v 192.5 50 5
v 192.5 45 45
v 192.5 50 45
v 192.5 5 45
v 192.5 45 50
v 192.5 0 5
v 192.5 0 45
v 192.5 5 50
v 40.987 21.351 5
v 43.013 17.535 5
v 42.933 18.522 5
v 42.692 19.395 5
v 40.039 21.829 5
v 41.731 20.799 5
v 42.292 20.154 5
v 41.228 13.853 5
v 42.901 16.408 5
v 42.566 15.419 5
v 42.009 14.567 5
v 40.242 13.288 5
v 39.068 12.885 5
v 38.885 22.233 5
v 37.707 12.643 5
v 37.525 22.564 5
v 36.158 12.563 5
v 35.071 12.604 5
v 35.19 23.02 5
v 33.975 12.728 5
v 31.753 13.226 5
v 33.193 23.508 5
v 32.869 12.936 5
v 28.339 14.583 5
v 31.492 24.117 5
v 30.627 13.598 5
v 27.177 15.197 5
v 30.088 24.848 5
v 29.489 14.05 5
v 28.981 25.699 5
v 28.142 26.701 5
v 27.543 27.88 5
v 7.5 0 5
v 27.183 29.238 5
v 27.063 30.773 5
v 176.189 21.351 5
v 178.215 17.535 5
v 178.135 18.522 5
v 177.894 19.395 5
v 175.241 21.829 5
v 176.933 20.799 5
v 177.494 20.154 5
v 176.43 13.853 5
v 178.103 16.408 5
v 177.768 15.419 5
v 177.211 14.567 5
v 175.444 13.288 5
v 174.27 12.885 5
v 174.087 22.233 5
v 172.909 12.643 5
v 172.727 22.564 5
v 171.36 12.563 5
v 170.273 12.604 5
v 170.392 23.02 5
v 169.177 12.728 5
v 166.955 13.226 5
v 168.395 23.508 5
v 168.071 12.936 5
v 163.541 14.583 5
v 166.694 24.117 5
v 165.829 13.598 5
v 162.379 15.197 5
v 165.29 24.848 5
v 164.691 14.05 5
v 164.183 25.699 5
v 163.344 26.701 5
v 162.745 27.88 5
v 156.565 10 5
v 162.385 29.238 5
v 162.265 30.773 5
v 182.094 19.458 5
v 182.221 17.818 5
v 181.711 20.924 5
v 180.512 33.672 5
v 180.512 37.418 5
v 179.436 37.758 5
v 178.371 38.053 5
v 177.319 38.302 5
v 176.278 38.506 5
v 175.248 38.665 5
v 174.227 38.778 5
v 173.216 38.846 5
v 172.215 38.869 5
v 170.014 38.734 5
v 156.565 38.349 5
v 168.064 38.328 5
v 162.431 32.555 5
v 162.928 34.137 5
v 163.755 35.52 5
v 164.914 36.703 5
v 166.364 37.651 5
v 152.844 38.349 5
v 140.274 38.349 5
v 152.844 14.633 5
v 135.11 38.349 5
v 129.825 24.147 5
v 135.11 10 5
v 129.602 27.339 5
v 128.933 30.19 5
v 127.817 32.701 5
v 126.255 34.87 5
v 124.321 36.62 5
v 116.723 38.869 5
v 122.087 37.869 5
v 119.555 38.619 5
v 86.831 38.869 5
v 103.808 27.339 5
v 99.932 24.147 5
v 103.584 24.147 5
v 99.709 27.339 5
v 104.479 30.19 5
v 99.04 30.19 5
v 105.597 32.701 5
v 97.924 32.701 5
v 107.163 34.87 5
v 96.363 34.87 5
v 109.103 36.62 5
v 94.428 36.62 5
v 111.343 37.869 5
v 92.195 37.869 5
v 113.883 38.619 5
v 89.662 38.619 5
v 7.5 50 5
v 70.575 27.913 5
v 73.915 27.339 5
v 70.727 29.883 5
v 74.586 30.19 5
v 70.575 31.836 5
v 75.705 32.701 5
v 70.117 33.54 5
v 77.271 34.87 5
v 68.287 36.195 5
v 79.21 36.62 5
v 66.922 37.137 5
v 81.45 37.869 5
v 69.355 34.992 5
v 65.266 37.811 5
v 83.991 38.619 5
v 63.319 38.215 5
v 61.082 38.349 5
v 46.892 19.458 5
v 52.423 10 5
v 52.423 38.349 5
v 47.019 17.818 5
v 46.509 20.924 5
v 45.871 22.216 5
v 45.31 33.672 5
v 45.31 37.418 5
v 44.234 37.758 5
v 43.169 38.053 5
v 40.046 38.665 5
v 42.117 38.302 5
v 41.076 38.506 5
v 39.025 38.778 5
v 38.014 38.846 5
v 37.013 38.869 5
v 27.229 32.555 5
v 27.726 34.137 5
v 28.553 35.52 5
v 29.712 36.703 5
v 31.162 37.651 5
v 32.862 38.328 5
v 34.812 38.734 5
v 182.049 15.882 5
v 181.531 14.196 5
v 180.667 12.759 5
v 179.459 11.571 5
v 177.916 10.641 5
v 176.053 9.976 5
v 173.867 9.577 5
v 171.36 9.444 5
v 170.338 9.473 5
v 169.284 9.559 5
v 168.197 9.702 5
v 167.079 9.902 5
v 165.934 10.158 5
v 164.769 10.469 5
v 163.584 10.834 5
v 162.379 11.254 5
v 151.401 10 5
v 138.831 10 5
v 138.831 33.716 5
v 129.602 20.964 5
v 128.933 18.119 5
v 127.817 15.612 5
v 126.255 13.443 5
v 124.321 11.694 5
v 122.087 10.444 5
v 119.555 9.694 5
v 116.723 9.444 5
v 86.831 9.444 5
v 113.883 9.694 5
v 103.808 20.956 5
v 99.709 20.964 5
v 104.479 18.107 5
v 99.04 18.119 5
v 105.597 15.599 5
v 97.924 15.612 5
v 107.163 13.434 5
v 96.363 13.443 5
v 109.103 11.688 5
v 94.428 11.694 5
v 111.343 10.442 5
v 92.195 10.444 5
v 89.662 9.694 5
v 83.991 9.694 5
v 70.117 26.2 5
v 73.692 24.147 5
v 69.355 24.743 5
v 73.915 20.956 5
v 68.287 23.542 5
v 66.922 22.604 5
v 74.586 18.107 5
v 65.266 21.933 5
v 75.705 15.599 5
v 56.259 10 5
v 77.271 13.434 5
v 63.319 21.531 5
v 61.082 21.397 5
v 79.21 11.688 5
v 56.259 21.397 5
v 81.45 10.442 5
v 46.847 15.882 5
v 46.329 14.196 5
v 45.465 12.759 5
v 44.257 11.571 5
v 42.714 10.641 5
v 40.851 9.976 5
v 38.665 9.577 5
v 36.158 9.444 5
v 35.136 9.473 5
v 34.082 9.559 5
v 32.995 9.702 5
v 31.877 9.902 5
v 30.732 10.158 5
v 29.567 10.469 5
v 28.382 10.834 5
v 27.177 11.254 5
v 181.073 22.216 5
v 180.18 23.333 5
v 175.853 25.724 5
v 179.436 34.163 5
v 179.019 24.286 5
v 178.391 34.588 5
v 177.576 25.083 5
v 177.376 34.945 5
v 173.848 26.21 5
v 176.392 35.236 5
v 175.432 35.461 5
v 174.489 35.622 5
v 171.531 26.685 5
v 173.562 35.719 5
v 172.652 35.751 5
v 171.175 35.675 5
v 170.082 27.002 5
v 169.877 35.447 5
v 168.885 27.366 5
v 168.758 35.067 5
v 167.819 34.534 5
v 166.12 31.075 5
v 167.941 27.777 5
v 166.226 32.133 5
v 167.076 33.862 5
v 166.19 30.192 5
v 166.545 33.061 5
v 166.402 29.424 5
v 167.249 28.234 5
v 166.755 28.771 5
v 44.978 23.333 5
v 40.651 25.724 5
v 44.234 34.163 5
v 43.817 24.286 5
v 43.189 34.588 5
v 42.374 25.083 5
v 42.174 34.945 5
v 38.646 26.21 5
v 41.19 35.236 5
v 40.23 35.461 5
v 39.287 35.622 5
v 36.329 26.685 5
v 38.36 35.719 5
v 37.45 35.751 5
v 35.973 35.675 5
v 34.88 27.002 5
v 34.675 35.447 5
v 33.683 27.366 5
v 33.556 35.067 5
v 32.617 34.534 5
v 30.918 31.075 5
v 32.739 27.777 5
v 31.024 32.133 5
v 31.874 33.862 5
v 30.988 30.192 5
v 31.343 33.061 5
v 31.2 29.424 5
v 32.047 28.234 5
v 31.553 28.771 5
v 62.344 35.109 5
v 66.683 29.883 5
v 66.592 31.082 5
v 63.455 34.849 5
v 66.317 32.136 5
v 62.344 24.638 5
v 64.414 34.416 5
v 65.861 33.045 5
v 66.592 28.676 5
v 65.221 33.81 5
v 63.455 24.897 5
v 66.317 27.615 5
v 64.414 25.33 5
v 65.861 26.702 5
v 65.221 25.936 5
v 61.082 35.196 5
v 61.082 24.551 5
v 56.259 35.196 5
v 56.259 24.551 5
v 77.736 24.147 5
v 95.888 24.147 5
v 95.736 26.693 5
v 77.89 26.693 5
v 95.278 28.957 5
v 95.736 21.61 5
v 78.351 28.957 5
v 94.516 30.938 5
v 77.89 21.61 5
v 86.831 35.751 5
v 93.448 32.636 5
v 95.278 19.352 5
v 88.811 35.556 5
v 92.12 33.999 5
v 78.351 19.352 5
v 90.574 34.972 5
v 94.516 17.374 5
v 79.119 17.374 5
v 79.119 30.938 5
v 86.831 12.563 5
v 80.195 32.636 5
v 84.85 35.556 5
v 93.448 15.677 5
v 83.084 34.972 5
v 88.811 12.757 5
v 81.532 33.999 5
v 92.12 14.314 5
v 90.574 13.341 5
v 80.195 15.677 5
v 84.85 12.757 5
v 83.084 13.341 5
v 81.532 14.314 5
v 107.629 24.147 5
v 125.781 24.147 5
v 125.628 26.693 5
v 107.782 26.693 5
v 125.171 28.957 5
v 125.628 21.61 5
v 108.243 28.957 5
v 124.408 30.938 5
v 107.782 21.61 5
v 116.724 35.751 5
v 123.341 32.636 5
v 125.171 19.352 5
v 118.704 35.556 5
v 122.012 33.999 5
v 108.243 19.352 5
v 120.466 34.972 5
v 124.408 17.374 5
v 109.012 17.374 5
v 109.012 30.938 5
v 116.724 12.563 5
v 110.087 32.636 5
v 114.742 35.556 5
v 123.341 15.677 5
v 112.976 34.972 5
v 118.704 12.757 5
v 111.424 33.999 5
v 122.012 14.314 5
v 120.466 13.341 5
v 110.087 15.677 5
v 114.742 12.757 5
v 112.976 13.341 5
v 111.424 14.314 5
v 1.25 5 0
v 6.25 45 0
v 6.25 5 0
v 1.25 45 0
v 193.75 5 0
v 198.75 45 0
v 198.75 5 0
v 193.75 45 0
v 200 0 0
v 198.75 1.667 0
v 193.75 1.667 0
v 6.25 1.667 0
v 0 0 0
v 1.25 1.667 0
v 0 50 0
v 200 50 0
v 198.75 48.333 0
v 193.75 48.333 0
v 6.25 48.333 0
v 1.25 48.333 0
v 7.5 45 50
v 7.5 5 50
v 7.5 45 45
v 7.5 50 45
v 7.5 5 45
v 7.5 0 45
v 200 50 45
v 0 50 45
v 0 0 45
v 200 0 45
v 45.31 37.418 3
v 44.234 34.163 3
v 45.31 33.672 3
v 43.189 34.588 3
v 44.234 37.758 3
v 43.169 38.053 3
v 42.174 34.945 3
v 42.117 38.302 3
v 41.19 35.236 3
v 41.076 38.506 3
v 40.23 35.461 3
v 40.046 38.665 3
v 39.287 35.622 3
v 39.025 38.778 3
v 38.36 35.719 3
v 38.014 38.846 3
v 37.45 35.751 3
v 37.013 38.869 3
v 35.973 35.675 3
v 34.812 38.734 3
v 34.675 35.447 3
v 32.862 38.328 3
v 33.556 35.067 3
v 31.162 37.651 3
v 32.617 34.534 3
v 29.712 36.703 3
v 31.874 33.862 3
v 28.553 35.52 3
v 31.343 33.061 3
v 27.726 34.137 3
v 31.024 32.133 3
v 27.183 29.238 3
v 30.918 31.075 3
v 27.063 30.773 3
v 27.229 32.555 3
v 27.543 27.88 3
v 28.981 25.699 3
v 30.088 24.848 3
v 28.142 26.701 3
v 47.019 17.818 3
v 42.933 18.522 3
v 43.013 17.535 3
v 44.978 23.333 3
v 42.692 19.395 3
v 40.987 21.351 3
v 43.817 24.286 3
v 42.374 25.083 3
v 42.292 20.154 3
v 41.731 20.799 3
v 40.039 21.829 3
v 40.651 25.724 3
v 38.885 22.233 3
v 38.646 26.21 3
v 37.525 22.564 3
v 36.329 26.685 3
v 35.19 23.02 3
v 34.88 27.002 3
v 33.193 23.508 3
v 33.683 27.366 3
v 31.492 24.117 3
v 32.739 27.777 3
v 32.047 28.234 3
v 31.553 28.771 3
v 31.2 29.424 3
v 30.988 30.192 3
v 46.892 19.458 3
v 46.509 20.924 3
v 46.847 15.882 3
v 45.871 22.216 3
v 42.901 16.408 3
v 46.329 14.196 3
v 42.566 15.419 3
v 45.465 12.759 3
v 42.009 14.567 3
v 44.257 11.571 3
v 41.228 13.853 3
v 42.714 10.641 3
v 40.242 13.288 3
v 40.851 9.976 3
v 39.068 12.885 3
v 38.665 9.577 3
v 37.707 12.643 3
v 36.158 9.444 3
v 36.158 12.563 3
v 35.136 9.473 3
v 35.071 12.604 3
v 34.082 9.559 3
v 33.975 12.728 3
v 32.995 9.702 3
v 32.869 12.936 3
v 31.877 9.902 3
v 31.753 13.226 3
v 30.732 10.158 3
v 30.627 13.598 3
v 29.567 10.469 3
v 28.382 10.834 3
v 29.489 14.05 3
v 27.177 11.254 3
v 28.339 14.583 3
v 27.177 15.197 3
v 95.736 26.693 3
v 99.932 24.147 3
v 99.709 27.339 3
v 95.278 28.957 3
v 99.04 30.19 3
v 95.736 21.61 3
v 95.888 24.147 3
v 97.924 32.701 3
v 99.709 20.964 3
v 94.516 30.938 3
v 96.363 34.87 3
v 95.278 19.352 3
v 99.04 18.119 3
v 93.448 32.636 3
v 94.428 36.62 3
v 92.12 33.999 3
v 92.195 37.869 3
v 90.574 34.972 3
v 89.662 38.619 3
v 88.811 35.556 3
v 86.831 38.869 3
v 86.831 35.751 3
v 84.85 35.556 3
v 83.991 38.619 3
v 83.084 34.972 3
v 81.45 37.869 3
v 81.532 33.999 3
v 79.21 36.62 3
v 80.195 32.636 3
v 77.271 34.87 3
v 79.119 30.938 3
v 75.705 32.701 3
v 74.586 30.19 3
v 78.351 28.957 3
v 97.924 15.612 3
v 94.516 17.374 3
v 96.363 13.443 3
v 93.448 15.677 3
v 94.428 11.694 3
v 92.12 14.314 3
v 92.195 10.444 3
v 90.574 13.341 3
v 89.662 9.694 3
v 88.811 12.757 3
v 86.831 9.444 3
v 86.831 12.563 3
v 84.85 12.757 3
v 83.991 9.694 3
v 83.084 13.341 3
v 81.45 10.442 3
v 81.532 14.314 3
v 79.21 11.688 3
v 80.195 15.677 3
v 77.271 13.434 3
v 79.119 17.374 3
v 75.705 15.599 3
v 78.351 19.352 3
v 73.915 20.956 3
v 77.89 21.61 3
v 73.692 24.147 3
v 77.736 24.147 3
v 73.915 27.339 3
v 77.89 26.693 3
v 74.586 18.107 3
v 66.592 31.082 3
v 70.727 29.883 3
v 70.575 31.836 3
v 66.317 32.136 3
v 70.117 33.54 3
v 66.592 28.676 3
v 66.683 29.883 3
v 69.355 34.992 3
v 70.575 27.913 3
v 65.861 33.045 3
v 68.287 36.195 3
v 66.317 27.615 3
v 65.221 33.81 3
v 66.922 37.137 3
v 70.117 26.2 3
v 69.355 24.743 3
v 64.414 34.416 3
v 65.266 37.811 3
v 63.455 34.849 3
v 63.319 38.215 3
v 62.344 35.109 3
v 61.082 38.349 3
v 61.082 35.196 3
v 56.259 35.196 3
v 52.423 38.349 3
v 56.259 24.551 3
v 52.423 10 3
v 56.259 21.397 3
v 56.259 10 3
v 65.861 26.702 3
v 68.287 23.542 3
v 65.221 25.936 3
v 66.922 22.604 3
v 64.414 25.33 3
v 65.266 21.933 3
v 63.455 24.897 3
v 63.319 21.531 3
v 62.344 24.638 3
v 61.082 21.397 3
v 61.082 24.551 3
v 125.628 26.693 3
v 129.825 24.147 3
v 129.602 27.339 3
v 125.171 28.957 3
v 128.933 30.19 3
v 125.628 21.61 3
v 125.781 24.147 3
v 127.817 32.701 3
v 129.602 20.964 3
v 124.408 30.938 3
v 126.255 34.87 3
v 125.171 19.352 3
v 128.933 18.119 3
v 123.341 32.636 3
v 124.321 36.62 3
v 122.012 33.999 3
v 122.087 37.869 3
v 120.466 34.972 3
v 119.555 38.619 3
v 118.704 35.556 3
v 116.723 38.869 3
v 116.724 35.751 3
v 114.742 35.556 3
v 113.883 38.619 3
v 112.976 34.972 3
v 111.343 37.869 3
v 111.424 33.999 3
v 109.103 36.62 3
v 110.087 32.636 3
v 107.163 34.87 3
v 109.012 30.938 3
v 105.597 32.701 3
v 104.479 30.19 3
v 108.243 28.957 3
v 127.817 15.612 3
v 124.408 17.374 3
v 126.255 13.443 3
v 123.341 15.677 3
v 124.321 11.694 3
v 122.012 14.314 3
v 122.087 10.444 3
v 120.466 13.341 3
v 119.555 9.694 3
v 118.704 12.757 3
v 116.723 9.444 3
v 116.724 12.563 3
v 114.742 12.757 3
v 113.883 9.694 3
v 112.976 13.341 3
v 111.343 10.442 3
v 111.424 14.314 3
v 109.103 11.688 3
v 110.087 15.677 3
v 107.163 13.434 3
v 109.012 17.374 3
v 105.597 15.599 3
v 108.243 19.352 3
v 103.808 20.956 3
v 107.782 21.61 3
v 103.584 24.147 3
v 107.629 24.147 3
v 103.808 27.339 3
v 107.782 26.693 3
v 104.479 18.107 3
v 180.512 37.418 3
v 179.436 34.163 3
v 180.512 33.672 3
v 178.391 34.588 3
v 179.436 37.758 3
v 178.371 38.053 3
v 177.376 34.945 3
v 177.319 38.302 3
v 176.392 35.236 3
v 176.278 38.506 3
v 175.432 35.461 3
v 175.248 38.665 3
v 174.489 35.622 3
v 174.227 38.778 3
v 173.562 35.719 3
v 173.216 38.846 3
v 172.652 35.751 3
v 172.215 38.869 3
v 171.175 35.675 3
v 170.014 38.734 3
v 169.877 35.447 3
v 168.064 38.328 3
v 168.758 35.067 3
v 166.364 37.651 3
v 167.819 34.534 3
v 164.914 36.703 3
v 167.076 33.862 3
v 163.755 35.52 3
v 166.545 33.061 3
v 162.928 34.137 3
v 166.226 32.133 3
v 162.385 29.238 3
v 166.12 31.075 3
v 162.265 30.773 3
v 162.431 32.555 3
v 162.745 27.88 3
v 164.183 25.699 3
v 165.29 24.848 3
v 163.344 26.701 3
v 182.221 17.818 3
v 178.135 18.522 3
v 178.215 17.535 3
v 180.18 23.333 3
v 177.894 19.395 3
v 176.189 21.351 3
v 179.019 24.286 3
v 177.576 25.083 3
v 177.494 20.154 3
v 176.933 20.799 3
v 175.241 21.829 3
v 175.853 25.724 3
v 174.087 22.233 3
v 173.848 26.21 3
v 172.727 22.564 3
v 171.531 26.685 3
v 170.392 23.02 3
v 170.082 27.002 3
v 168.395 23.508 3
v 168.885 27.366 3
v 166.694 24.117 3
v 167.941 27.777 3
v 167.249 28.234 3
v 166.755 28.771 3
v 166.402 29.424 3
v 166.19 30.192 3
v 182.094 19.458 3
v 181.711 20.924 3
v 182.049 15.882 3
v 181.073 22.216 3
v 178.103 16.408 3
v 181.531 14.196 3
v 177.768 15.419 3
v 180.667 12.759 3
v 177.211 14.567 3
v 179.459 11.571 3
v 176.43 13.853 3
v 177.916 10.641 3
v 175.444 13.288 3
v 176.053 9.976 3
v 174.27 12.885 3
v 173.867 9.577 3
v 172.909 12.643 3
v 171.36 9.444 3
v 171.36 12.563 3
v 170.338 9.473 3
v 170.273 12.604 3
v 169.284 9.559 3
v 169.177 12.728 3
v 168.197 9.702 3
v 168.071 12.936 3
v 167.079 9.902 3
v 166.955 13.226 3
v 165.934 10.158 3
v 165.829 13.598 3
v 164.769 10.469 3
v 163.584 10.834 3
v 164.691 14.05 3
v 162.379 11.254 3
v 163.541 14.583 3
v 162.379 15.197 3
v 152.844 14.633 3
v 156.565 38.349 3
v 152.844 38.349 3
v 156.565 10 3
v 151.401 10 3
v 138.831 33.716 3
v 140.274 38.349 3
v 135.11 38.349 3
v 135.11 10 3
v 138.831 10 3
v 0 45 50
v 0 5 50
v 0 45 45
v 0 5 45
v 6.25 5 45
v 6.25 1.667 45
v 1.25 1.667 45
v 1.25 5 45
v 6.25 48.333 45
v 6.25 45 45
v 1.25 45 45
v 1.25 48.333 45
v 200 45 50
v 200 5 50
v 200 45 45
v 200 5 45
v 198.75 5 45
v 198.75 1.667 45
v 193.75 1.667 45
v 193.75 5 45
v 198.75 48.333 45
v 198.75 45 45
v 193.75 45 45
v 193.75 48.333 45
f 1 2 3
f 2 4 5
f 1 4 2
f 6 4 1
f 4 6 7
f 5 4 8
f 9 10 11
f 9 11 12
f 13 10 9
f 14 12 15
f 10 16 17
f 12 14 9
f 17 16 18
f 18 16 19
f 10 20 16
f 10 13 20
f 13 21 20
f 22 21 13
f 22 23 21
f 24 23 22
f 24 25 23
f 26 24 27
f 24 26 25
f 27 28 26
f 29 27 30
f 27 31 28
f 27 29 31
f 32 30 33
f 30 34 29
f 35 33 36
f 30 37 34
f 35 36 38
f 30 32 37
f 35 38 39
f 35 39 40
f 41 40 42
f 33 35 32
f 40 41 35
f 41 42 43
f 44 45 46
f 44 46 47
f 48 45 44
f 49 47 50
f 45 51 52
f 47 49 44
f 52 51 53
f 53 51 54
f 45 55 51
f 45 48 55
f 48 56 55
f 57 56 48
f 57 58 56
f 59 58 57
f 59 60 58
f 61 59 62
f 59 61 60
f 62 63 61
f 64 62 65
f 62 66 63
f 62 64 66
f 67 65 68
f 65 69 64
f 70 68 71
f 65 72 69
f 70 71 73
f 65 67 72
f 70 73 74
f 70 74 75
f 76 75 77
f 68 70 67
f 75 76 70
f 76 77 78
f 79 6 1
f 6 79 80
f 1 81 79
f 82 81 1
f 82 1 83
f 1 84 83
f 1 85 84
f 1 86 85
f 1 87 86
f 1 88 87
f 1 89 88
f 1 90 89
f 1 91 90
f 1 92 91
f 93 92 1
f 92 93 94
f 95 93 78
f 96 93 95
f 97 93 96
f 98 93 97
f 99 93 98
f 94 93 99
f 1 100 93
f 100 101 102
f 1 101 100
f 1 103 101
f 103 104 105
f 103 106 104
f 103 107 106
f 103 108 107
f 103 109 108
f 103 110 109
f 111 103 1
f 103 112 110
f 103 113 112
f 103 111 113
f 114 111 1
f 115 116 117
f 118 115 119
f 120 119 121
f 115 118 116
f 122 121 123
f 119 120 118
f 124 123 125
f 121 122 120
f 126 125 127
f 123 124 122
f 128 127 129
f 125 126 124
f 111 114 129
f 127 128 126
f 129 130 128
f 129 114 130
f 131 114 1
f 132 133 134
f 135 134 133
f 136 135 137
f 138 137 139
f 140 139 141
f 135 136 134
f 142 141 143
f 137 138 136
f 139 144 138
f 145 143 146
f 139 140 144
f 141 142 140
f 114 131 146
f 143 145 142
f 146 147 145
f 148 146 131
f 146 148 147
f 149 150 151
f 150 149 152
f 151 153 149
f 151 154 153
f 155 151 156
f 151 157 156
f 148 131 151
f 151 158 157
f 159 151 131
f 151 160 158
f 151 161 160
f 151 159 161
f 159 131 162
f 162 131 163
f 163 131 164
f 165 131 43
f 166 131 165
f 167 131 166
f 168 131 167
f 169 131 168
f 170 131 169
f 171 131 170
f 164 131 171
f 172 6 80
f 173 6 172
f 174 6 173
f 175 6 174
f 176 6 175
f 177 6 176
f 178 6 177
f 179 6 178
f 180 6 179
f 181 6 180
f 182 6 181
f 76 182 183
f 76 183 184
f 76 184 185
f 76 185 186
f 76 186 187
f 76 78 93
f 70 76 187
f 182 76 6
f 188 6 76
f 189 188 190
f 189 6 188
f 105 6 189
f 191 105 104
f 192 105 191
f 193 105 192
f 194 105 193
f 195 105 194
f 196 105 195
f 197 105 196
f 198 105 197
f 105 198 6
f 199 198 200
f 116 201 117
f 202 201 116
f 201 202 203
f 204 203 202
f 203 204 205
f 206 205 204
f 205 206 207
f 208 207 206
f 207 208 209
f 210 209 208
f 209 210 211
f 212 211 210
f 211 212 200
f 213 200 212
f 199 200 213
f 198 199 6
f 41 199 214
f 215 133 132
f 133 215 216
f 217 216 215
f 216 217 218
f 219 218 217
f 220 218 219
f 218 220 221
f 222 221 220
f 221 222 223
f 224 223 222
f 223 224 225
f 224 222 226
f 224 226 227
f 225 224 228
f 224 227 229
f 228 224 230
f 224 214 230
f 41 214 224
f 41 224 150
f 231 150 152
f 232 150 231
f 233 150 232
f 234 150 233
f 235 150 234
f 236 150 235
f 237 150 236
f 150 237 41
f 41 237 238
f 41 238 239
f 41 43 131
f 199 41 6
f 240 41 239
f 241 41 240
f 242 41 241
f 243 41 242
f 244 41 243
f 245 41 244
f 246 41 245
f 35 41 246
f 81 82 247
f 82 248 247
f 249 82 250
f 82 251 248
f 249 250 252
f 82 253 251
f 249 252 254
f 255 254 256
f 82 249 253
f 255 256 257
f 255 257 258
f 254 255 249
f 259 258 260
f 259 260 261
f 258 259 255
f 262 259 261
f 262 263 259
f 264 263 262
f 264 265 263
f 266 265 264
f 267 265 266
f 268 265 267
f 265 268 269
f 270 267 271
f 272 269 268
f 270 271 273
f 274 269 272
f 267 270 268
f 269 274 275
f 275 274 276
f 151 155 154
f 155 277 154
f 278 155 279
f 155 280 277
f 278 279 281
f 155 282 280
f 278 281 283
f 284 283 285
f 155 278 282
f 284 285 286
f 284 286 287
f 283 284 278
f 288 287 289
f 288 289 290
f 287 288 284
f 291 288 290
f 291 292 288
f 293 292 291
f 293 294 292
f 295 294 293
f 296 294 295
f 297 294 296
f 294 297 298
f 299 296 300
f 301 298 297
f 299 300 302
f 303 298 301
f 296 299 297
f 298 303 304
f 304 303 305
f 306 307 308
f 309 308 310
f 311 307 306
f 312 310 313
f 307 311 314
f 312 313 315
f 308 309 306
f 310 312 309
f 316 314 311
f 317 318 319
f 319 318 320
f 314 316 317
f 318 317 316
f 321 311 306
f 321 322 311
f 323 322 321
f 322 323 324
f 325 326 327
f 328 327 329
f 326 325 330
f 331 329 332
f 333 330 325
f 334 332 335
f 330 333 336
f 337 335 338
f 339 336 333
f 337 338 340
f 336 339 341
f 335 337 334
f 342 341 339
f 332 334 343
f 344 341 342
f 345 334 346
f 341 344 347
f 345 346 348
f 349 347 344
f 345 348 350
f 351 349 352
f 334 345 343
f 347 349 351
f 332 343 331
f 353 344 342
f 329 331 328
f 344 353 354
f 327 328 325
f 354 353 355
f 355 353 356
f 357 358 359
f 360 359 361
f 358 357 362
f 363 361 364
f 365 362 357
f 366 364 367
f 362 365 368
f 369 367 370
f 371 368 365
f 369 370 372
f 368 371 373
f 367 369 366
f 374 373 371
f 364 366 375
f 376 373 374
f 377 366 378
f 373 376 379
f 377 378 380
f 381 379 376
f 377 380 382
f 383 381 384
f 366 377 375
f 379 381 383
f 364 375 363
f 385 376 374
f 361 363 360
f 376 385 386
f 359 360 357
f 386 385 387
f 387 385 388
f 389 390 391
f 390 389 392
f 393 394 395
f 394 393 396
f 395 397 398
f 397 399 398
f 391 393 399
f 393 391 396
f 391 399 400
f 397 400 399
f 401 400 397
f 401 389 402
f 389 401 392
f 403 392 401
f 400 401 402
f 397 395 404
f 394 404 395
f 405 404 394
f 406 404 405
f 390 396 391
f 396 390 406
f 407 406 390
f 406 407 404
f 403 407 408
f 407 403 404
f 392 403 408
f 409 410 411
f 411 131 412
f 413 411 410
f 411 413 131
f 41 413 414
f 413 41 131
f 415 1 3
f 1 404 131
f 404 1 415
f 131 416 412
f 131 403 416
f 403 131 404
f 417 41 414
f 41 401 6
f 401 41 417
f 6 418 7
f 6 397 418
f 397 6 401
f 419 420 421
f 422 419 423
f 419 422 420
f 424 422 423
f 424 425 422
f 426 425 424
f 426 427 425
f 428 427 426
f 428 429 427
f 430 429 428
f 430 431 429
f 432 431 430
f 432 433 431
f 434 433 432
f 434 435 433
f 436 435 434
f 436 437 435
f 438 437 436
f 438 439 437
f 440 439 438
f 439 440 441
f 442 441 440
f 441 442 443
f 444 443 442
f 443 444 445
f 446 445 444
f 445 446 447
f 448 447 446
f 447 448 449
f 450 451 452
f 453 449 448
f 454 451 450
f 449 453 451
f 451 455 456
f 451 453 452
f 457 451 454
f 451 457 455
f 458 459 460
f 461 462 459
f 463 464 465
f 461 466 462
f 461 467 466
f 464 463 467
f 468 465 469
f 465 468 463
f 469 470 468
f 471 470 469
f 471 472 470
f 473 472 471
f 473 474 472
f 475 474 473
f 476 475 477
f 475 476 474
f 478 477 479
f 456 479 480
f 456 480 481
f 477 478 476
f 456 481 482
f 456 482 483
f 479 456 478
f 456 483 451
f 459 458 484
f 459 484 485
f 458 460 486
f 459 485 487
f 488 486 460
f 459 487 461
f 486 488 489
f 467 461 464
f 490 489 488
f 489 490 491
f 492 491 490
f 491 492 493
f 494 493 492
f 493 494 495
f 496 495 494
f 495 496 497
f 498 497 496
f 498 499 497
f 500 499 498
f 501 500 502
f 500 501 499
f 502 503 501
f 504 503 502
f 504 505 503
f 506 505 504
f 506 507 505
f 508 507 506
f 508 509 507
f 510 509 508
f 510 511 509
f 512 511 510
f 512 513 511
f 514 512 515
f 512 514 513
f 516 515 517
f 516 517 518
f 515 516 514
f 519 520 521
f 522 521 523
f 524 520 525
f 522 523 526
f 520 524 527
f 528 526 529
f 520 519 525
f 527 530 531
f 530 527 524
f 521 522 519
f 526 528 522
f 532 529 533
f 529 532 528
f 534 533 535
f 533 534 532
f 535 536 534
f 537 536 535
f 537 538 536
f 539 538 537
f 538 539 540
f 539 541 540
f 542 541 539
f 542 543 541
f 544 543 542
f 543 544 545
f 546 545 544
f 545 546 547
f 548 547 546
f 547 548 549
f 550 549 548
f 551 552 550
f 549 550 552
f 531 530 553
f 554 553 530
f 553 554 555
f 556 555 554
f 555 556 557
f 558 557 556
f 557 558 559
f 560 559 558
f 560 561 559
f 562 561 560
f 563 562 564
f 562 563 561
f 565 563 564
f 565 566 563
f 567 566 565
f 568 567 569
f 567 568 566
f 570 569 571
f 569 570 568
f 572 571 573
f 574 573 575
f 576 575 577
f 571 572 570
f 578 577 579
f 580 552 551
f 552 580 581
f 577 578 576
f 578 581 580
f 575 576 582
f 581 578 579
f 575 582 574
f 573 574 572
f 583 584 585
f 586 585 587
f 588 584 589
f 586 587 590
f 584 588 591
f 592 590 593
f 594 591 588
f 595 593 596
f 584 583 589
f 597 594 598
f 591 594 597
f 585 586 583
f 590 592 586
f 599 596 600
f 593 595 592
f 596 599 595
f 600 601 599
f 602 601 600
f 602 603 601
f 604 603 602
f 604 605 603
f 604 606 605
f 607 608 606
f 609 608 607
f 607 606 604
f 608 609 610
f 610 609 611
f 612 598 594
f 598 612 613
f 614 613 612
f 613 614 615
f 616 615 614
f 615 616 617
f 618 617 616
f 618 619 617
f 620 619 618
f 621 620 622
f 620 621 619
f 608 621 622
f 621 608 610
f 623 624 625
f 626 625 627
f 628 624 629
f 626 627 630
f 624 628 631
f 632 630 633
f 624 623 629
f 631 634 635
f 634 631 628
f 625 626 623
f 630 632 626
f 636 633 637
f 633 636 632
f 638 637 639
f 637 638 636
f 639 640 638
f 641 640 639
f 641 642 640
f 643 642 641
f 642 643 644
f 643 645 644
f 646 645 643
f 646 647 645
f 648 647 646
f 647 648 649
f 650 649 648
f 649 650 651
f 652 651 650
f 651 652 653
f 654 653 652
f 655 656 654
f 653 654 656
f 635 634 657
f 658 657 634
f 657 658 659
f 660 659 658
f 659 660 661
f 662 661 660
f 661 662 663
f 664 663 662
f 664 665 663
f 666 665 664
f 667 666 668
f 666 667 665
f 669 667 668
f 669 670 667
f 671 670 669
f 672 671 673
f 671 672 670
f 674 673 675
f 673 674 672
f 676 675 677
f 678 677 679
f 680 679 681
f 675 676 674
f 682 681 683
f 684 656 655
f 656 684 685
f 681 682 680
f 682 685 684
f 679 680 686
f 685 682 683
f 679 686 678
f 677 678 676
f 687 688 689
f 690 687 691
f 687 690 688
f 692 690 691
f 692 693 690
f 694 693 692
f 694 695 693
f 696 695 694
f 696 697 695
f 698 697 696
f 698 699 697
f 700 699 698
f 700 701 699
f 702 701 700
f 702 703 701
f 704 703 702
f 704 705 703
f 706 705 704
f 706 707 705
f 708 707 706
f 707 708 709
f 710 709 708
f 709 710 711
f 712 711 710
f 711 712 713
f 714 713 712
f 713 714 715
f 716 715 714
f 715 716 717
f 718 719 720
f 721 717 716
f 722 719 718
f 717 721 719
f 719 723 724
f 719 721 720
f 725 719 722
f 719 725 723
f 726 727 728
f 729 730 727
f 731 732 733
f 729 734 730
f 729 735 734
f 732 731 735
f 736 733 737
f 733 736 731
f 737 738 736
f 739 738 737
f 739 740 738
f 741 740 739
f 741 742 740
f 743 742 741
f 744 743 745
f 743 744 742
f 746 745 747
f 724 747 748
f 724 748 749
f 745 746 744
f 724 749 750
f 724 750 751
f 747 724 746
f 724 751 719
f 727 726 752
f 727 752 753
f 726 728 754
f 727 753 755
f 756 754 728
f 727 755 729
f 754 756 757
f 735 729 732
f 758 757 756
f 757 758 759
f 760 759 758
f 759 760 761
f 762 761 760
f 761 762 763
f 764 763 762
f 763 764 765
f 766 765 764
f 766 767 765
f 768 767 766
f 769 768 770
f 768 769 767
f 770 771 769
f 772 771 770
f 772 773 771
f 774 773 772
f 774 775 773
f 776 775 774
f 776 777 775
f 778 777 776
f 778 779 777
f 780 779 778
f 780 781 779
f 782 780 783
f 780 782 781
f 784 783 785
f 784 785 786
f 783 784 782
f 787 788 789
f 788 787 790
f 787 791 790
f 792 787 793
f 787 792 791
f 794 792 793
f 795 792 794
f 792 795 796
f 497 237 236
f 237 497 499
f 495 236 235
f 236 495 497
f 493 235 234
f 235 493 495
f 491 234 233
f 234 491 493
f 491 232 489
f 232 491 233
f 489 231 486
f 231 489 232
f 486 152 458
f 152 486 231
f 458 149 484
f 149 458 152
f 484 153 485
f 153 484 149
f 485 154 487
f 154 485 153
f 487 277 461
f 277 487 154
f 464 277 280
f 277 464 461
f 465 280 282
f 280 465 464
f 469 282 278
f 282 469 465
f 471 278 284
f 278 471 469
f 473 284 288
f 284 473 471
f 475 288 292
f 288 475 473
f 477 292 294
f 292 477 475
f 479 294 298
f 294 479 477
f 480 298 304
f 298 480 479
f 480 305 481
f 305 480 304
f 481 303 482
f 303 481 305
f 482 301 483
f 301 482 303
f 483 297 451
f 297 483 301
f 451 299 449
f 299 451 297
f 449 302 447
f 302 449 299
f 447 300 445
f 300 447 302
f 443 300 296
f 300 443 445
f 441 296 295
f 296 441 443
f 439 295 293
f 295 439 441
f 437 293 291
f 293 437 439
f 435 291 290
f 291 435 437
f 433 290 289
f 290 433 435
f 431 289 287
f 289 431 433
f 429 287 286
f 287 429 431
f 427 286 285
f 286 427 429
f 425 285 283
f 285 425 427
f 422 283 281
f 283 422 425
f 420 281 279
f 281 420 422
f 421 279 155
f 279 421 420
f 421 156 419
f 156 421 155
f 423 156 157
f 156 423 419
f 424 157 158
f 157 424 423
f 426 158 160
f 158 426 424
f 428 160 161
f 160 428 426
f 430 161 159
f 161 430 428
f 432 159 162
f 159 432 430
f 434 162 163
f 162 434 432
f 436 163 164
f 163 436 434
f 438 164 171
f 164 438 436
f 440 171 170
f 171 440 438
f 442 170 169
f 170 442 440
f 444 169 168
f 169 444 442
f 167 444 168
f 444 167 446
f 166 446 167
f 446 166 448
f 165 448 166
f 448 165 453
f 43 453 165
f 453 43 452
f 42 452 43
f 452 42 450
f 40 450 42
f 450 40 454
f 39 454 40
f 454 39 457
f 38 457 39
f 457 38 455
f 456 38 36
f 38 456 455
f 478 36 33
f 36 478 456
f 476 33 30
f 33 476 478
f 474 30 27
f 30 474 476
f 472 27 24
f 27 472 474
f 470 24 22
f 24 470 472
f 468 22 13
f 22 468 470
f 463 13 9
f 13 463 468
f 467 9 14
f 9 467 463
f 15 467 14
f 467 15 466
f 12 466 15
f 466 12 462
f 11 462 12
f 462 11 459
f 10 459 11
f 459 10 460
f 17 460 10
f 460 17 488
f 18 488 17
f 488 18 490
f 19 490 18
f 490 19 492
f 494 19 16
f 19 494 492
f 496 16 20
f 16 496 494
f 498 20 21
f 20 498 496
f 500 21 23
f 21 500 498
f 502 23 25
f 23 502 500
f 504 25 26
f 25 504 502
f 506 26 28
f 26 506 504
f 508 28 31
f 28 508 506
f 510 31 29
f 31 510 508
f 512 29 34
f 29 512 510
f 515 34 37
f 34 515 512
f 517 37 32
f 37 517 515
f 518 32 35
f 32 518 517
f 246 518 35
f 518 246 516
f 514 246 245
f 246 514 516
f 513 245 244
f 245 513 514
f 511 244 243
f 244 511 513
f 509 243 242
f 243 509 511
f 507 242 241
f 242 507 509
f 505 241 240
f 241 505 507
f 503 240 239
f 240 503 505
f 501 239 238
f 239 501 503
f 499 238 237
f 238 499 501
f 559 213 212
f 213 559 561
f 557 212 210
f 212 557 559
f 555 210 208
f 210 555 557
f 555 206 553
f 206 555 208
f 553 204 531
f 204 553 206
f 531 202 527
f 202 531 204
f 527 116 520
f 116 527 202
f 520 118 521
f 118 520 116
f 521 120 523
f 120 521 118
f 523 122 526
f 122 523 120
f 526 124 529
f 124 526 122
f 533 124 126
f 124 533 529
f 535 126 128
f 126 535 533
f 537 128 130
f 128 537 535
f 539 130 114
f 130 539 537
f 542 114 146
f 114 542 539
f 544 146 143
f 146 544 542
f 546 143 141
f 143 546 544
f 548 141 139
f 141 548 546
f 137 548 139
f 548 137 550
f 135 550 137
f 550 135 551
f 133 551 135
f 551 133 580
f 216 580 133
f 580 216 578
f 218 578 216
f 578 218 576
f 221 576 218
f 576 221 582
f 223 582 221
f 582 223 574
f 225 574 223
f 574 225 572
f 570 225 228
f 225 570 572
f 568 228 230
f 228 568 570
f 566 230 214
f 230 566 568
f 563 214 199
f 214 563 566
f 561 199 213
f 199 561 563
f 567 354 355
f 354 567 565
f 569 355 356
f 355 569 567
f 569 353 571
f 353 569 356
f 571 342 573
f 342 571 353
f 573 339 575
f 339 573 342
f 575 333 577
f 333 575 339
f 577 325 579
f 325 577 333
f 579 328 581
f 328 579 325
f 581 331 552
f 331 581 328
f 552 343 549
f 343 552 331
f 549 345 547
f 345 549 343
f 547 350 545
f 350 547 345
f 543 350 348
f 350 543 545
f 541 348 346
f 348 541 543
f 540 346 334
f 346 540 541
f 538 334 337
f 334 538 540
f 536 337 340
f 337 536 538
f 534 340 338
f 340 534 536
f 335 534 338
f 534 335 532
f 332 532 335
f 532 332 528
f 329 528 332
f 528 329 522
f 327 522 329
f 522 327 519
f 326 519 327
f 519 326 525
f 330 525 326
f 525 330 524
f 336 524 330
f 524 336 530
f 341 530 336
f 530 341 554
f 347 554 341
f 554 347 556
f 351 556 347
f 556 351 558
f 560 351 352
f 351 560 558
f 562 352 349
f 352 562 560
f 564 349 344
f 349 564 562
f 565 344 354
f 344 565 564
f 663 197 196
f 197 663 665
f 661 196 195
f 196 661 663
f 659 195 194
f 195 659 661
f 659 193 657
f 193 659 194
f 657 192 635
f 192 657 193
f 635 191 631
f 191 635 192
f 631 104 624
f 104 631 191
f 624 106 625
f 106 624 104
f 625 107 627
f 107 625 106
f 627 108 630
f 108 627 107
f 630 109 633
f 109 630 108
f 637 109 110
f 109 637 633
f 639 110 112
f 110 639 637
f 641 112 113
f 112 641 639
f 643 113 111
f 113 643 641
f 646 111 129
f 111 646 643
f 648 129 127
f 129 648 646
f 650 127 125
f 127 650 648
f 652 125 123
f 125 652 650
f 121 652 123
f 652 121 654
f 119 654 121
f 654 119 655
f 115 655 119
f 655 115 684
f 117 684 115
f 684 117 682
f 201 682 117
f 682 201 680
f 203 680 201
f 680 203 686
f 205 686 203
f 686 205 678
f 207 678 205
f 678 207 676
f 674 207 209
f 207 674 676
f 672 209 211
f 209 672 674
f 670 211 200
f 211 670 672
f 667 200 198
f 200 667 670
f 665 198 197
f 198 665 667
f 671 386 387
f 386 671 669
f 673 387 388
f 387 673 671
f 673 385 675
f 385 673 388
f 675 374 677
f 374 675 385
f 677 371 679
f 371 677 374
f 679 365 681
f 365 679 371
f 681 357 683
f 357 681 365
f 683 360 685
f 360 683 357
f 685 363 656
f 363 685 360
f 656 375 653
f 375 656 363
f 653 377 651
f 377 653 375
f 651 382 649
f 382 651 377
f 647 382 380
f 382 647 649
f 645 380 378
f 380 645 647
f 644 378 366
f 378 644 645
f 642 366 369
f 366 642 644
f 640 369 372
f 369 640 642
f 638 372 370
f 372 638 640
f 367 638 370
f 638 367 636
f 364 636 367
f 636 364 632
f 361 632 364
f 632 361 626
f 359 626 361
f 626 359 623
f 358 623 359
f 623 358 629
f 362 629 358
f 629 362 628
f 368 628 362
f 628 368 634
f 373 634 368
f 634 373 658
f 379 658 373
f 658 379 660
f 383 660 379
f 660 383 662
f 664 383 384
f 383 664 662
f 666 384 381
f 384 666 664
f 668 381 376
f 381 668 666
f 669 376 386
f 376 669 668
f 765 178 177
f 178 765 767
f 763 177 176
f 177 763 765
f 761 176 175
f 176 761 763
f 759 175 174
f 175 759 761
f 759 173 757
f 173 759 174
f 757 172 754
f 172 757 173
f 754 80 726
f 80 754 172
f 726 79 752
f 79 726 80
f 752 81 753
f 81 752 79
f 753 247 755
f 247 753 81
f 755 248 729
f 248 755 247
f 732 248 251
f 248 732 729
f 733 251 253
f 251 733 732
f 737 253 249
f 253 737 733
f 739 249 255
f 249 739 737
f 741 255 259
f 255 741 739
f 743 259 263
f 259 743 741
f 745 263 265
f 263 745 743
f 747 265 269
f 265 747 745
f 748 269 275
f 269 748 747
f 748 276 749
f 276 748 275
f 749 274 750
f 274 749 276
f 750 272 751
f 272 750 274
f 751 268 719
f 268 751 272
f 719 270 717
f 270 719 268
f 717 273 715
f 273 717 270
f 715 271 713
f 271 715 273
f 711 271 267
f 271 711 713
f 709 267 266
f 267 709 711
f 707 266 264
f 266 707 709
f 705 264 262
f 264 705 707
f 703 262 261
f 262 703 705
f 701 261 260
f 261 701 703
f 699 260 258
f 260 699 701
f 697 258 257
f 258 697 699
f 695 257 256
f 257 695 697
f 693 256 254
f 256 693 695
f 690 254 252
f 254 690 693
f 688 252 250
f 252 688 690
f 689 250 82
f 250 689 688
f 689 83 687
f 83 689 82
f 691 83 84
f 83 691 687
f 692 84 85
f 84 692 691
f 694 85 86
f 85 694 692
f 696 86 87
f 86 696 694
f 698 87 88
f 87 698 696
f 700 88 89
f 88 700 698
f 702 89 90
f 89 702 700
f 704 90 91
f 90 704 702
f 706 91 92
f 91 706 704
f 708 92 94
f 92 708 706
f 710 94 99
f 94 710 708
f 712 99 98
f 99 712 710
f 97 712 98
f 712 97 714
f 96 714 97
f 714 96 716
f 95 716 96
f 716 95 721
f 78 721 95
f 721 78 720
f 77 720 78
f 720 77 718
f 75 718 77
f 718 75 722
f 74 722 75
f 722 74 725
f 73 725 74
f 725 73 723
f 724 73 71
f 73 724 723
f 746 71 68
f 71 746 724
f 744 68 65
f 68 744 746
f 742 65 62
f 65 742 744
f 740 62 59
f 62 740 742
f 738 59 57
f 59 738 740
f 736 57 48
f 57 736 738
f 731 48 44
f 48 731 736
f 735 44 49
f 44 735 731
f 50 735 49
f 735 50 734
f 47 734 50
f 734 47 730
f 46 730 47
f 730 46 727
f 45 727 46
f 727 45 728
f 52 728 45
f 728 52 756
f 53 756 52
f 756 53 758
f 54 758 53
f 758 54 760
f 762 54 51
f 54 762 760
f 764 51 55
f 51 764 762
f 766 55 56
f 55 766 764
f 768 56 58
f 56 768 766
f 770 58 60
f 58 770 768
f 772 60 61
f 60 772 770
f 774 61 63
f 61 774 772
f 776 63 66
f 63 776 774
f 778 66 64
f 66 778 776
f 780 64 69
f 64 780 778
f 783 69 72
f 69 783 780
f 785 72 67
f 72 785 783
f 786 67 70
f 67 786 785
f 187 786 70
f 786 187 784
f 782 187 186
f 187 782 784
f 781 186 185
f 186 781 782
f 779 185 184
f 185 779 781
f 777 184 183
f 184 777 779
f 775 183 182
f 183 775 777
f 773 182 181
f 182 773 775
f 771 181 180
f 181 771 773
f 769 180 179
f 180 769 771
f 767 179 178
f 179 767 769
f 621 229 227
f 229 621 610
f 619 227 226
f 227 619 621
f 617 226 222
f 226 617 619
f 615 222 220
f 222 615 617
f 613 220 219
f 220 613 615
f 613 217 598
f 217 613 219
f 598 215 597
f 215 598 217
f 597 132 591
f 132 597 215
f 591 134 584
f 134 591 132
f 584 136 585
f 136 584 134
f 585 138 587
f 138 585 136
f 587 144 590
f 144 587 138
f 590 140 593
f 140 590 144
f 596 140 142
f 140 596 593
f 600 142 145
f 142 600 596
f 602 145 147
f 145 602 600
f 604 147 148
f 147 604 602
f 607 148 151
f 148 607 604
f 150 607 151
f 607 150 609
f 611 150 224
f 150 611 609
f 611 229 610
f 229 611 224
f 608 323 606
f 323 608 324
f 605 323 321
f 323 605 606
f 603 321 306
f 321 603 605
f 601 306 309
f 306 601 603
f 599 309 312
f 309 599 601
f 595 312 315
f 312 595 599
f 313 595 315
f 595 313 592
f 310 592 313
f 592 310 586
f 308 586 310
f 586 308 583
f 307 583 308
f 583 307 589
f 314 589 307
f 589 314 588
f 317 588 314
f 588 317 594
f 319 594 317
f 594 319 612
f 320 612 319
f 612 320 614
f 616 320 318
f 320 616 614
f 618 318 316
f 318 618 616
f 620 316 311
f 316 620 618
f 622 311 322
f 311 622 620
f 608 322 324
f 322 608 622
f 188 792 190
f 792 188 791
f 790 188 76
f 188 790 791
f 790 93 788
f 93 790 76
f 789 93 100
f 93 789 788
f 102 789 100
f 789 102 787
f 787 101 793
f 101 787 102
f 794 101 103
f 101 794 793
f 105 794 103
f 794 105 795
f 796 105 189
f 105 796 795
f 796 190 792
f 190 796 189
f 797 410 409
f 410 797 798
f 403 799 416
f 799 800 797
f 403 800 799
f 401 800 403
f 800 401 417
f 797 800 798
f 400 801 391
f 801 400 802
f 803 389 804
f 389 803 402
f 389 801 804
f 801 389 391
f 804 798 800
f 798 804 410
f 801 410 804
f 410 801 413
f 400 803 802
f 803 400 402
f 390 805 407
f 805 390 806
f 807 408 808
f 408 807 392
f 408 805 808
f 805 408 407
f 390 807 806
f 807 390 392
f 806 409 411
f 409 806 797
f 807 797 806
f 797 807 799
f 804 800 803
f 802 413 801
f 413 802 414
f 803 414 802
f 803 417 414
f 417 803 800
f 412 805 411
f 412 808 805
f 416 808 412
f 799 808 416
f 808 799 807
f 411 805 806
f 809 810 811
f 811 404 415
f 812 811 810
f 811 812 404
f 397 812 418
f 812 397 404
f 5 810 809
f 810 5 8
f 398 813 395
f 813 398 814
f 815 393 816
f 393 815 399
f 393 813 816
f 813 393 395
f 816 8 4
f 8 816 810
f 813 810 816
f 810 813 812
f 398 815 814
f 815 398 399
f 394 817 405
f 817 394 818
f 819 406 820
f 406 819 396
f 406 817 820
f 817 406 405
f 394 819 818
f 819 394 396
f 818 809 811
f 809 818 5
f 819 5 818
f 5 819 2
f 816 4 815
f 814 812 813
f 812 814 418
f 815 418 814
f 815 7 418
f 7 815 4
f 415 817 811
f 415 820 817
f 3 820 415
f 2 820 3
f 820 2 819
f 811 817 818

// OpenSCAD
length=200;
width=5;
widthFactor=1.5;
height=50;
angle=25;
boxwidth=50;
cut_width=15;

module longside(y){
    difference(){
        color("purple") translate([0, max(0,y-width),0]) cube([length,width,height]);
        color("cyan"){
            for(i=[0:9]){
                translate([i*19+7, max(0,y-width), 0]) cube([cut_width, width, height-5]);                
            }
        }
    }
}

module shortside(x){
    holesize = 2/3*width*widthFactor;
    cubesizefactor=1.25;
    difference(){
        translate([x,0,0]) cube([widthFactor*width,boxwidth,height]);
        color("purple") translate([x+holesize/4, width*1/3, 0]) cube(size=[holesize, holesize/widthFactor, height], center=false);
        color("purple") translate([x+holesize/4, boxwidth-width, 0]) cube(size=[holesize, holesize/widthFactor, height], center=false);
        color("red") translate([x, 0, height-width]) cube(size=[width*widthFactor, width, width], center=false);
        color("red") translate([x, boxwidth-width, height-width]) cube(size=[width*widthFactor, width, width], center=false);
        // color("cyan"){
        //     for(i=[0:1]){
        //         translate([x, i*19+8.5, 5]) rotate([0,0,0]) cube([width, cut_width, cut_height]);                
        //     }
        // }
    }
}

module base(){
    baseHeight = 5;
    translate([width*widthFactor,0,0]) difference() {
        cube([length - 2*(width*widthFactor), boxwidth, baseHeight]);
        color("red"){
            translate([17, 10, 3])
            linear_extrude(baseHeight-3)
            text("SPOONS",size=28,font = "Atkinson Hyperligible Mono:style=Italic");
        }
    }
}

module basePiece(){
color("lightgreen") base();
shortside(0);
shortside(length-(width*widthFactor));    
}

module longsidecut(y){
    difference(){
        longside(y);
        basePiece();
    }
}

basePiece();
// longsidecut(0);
// longsidecut(boxwidth);
